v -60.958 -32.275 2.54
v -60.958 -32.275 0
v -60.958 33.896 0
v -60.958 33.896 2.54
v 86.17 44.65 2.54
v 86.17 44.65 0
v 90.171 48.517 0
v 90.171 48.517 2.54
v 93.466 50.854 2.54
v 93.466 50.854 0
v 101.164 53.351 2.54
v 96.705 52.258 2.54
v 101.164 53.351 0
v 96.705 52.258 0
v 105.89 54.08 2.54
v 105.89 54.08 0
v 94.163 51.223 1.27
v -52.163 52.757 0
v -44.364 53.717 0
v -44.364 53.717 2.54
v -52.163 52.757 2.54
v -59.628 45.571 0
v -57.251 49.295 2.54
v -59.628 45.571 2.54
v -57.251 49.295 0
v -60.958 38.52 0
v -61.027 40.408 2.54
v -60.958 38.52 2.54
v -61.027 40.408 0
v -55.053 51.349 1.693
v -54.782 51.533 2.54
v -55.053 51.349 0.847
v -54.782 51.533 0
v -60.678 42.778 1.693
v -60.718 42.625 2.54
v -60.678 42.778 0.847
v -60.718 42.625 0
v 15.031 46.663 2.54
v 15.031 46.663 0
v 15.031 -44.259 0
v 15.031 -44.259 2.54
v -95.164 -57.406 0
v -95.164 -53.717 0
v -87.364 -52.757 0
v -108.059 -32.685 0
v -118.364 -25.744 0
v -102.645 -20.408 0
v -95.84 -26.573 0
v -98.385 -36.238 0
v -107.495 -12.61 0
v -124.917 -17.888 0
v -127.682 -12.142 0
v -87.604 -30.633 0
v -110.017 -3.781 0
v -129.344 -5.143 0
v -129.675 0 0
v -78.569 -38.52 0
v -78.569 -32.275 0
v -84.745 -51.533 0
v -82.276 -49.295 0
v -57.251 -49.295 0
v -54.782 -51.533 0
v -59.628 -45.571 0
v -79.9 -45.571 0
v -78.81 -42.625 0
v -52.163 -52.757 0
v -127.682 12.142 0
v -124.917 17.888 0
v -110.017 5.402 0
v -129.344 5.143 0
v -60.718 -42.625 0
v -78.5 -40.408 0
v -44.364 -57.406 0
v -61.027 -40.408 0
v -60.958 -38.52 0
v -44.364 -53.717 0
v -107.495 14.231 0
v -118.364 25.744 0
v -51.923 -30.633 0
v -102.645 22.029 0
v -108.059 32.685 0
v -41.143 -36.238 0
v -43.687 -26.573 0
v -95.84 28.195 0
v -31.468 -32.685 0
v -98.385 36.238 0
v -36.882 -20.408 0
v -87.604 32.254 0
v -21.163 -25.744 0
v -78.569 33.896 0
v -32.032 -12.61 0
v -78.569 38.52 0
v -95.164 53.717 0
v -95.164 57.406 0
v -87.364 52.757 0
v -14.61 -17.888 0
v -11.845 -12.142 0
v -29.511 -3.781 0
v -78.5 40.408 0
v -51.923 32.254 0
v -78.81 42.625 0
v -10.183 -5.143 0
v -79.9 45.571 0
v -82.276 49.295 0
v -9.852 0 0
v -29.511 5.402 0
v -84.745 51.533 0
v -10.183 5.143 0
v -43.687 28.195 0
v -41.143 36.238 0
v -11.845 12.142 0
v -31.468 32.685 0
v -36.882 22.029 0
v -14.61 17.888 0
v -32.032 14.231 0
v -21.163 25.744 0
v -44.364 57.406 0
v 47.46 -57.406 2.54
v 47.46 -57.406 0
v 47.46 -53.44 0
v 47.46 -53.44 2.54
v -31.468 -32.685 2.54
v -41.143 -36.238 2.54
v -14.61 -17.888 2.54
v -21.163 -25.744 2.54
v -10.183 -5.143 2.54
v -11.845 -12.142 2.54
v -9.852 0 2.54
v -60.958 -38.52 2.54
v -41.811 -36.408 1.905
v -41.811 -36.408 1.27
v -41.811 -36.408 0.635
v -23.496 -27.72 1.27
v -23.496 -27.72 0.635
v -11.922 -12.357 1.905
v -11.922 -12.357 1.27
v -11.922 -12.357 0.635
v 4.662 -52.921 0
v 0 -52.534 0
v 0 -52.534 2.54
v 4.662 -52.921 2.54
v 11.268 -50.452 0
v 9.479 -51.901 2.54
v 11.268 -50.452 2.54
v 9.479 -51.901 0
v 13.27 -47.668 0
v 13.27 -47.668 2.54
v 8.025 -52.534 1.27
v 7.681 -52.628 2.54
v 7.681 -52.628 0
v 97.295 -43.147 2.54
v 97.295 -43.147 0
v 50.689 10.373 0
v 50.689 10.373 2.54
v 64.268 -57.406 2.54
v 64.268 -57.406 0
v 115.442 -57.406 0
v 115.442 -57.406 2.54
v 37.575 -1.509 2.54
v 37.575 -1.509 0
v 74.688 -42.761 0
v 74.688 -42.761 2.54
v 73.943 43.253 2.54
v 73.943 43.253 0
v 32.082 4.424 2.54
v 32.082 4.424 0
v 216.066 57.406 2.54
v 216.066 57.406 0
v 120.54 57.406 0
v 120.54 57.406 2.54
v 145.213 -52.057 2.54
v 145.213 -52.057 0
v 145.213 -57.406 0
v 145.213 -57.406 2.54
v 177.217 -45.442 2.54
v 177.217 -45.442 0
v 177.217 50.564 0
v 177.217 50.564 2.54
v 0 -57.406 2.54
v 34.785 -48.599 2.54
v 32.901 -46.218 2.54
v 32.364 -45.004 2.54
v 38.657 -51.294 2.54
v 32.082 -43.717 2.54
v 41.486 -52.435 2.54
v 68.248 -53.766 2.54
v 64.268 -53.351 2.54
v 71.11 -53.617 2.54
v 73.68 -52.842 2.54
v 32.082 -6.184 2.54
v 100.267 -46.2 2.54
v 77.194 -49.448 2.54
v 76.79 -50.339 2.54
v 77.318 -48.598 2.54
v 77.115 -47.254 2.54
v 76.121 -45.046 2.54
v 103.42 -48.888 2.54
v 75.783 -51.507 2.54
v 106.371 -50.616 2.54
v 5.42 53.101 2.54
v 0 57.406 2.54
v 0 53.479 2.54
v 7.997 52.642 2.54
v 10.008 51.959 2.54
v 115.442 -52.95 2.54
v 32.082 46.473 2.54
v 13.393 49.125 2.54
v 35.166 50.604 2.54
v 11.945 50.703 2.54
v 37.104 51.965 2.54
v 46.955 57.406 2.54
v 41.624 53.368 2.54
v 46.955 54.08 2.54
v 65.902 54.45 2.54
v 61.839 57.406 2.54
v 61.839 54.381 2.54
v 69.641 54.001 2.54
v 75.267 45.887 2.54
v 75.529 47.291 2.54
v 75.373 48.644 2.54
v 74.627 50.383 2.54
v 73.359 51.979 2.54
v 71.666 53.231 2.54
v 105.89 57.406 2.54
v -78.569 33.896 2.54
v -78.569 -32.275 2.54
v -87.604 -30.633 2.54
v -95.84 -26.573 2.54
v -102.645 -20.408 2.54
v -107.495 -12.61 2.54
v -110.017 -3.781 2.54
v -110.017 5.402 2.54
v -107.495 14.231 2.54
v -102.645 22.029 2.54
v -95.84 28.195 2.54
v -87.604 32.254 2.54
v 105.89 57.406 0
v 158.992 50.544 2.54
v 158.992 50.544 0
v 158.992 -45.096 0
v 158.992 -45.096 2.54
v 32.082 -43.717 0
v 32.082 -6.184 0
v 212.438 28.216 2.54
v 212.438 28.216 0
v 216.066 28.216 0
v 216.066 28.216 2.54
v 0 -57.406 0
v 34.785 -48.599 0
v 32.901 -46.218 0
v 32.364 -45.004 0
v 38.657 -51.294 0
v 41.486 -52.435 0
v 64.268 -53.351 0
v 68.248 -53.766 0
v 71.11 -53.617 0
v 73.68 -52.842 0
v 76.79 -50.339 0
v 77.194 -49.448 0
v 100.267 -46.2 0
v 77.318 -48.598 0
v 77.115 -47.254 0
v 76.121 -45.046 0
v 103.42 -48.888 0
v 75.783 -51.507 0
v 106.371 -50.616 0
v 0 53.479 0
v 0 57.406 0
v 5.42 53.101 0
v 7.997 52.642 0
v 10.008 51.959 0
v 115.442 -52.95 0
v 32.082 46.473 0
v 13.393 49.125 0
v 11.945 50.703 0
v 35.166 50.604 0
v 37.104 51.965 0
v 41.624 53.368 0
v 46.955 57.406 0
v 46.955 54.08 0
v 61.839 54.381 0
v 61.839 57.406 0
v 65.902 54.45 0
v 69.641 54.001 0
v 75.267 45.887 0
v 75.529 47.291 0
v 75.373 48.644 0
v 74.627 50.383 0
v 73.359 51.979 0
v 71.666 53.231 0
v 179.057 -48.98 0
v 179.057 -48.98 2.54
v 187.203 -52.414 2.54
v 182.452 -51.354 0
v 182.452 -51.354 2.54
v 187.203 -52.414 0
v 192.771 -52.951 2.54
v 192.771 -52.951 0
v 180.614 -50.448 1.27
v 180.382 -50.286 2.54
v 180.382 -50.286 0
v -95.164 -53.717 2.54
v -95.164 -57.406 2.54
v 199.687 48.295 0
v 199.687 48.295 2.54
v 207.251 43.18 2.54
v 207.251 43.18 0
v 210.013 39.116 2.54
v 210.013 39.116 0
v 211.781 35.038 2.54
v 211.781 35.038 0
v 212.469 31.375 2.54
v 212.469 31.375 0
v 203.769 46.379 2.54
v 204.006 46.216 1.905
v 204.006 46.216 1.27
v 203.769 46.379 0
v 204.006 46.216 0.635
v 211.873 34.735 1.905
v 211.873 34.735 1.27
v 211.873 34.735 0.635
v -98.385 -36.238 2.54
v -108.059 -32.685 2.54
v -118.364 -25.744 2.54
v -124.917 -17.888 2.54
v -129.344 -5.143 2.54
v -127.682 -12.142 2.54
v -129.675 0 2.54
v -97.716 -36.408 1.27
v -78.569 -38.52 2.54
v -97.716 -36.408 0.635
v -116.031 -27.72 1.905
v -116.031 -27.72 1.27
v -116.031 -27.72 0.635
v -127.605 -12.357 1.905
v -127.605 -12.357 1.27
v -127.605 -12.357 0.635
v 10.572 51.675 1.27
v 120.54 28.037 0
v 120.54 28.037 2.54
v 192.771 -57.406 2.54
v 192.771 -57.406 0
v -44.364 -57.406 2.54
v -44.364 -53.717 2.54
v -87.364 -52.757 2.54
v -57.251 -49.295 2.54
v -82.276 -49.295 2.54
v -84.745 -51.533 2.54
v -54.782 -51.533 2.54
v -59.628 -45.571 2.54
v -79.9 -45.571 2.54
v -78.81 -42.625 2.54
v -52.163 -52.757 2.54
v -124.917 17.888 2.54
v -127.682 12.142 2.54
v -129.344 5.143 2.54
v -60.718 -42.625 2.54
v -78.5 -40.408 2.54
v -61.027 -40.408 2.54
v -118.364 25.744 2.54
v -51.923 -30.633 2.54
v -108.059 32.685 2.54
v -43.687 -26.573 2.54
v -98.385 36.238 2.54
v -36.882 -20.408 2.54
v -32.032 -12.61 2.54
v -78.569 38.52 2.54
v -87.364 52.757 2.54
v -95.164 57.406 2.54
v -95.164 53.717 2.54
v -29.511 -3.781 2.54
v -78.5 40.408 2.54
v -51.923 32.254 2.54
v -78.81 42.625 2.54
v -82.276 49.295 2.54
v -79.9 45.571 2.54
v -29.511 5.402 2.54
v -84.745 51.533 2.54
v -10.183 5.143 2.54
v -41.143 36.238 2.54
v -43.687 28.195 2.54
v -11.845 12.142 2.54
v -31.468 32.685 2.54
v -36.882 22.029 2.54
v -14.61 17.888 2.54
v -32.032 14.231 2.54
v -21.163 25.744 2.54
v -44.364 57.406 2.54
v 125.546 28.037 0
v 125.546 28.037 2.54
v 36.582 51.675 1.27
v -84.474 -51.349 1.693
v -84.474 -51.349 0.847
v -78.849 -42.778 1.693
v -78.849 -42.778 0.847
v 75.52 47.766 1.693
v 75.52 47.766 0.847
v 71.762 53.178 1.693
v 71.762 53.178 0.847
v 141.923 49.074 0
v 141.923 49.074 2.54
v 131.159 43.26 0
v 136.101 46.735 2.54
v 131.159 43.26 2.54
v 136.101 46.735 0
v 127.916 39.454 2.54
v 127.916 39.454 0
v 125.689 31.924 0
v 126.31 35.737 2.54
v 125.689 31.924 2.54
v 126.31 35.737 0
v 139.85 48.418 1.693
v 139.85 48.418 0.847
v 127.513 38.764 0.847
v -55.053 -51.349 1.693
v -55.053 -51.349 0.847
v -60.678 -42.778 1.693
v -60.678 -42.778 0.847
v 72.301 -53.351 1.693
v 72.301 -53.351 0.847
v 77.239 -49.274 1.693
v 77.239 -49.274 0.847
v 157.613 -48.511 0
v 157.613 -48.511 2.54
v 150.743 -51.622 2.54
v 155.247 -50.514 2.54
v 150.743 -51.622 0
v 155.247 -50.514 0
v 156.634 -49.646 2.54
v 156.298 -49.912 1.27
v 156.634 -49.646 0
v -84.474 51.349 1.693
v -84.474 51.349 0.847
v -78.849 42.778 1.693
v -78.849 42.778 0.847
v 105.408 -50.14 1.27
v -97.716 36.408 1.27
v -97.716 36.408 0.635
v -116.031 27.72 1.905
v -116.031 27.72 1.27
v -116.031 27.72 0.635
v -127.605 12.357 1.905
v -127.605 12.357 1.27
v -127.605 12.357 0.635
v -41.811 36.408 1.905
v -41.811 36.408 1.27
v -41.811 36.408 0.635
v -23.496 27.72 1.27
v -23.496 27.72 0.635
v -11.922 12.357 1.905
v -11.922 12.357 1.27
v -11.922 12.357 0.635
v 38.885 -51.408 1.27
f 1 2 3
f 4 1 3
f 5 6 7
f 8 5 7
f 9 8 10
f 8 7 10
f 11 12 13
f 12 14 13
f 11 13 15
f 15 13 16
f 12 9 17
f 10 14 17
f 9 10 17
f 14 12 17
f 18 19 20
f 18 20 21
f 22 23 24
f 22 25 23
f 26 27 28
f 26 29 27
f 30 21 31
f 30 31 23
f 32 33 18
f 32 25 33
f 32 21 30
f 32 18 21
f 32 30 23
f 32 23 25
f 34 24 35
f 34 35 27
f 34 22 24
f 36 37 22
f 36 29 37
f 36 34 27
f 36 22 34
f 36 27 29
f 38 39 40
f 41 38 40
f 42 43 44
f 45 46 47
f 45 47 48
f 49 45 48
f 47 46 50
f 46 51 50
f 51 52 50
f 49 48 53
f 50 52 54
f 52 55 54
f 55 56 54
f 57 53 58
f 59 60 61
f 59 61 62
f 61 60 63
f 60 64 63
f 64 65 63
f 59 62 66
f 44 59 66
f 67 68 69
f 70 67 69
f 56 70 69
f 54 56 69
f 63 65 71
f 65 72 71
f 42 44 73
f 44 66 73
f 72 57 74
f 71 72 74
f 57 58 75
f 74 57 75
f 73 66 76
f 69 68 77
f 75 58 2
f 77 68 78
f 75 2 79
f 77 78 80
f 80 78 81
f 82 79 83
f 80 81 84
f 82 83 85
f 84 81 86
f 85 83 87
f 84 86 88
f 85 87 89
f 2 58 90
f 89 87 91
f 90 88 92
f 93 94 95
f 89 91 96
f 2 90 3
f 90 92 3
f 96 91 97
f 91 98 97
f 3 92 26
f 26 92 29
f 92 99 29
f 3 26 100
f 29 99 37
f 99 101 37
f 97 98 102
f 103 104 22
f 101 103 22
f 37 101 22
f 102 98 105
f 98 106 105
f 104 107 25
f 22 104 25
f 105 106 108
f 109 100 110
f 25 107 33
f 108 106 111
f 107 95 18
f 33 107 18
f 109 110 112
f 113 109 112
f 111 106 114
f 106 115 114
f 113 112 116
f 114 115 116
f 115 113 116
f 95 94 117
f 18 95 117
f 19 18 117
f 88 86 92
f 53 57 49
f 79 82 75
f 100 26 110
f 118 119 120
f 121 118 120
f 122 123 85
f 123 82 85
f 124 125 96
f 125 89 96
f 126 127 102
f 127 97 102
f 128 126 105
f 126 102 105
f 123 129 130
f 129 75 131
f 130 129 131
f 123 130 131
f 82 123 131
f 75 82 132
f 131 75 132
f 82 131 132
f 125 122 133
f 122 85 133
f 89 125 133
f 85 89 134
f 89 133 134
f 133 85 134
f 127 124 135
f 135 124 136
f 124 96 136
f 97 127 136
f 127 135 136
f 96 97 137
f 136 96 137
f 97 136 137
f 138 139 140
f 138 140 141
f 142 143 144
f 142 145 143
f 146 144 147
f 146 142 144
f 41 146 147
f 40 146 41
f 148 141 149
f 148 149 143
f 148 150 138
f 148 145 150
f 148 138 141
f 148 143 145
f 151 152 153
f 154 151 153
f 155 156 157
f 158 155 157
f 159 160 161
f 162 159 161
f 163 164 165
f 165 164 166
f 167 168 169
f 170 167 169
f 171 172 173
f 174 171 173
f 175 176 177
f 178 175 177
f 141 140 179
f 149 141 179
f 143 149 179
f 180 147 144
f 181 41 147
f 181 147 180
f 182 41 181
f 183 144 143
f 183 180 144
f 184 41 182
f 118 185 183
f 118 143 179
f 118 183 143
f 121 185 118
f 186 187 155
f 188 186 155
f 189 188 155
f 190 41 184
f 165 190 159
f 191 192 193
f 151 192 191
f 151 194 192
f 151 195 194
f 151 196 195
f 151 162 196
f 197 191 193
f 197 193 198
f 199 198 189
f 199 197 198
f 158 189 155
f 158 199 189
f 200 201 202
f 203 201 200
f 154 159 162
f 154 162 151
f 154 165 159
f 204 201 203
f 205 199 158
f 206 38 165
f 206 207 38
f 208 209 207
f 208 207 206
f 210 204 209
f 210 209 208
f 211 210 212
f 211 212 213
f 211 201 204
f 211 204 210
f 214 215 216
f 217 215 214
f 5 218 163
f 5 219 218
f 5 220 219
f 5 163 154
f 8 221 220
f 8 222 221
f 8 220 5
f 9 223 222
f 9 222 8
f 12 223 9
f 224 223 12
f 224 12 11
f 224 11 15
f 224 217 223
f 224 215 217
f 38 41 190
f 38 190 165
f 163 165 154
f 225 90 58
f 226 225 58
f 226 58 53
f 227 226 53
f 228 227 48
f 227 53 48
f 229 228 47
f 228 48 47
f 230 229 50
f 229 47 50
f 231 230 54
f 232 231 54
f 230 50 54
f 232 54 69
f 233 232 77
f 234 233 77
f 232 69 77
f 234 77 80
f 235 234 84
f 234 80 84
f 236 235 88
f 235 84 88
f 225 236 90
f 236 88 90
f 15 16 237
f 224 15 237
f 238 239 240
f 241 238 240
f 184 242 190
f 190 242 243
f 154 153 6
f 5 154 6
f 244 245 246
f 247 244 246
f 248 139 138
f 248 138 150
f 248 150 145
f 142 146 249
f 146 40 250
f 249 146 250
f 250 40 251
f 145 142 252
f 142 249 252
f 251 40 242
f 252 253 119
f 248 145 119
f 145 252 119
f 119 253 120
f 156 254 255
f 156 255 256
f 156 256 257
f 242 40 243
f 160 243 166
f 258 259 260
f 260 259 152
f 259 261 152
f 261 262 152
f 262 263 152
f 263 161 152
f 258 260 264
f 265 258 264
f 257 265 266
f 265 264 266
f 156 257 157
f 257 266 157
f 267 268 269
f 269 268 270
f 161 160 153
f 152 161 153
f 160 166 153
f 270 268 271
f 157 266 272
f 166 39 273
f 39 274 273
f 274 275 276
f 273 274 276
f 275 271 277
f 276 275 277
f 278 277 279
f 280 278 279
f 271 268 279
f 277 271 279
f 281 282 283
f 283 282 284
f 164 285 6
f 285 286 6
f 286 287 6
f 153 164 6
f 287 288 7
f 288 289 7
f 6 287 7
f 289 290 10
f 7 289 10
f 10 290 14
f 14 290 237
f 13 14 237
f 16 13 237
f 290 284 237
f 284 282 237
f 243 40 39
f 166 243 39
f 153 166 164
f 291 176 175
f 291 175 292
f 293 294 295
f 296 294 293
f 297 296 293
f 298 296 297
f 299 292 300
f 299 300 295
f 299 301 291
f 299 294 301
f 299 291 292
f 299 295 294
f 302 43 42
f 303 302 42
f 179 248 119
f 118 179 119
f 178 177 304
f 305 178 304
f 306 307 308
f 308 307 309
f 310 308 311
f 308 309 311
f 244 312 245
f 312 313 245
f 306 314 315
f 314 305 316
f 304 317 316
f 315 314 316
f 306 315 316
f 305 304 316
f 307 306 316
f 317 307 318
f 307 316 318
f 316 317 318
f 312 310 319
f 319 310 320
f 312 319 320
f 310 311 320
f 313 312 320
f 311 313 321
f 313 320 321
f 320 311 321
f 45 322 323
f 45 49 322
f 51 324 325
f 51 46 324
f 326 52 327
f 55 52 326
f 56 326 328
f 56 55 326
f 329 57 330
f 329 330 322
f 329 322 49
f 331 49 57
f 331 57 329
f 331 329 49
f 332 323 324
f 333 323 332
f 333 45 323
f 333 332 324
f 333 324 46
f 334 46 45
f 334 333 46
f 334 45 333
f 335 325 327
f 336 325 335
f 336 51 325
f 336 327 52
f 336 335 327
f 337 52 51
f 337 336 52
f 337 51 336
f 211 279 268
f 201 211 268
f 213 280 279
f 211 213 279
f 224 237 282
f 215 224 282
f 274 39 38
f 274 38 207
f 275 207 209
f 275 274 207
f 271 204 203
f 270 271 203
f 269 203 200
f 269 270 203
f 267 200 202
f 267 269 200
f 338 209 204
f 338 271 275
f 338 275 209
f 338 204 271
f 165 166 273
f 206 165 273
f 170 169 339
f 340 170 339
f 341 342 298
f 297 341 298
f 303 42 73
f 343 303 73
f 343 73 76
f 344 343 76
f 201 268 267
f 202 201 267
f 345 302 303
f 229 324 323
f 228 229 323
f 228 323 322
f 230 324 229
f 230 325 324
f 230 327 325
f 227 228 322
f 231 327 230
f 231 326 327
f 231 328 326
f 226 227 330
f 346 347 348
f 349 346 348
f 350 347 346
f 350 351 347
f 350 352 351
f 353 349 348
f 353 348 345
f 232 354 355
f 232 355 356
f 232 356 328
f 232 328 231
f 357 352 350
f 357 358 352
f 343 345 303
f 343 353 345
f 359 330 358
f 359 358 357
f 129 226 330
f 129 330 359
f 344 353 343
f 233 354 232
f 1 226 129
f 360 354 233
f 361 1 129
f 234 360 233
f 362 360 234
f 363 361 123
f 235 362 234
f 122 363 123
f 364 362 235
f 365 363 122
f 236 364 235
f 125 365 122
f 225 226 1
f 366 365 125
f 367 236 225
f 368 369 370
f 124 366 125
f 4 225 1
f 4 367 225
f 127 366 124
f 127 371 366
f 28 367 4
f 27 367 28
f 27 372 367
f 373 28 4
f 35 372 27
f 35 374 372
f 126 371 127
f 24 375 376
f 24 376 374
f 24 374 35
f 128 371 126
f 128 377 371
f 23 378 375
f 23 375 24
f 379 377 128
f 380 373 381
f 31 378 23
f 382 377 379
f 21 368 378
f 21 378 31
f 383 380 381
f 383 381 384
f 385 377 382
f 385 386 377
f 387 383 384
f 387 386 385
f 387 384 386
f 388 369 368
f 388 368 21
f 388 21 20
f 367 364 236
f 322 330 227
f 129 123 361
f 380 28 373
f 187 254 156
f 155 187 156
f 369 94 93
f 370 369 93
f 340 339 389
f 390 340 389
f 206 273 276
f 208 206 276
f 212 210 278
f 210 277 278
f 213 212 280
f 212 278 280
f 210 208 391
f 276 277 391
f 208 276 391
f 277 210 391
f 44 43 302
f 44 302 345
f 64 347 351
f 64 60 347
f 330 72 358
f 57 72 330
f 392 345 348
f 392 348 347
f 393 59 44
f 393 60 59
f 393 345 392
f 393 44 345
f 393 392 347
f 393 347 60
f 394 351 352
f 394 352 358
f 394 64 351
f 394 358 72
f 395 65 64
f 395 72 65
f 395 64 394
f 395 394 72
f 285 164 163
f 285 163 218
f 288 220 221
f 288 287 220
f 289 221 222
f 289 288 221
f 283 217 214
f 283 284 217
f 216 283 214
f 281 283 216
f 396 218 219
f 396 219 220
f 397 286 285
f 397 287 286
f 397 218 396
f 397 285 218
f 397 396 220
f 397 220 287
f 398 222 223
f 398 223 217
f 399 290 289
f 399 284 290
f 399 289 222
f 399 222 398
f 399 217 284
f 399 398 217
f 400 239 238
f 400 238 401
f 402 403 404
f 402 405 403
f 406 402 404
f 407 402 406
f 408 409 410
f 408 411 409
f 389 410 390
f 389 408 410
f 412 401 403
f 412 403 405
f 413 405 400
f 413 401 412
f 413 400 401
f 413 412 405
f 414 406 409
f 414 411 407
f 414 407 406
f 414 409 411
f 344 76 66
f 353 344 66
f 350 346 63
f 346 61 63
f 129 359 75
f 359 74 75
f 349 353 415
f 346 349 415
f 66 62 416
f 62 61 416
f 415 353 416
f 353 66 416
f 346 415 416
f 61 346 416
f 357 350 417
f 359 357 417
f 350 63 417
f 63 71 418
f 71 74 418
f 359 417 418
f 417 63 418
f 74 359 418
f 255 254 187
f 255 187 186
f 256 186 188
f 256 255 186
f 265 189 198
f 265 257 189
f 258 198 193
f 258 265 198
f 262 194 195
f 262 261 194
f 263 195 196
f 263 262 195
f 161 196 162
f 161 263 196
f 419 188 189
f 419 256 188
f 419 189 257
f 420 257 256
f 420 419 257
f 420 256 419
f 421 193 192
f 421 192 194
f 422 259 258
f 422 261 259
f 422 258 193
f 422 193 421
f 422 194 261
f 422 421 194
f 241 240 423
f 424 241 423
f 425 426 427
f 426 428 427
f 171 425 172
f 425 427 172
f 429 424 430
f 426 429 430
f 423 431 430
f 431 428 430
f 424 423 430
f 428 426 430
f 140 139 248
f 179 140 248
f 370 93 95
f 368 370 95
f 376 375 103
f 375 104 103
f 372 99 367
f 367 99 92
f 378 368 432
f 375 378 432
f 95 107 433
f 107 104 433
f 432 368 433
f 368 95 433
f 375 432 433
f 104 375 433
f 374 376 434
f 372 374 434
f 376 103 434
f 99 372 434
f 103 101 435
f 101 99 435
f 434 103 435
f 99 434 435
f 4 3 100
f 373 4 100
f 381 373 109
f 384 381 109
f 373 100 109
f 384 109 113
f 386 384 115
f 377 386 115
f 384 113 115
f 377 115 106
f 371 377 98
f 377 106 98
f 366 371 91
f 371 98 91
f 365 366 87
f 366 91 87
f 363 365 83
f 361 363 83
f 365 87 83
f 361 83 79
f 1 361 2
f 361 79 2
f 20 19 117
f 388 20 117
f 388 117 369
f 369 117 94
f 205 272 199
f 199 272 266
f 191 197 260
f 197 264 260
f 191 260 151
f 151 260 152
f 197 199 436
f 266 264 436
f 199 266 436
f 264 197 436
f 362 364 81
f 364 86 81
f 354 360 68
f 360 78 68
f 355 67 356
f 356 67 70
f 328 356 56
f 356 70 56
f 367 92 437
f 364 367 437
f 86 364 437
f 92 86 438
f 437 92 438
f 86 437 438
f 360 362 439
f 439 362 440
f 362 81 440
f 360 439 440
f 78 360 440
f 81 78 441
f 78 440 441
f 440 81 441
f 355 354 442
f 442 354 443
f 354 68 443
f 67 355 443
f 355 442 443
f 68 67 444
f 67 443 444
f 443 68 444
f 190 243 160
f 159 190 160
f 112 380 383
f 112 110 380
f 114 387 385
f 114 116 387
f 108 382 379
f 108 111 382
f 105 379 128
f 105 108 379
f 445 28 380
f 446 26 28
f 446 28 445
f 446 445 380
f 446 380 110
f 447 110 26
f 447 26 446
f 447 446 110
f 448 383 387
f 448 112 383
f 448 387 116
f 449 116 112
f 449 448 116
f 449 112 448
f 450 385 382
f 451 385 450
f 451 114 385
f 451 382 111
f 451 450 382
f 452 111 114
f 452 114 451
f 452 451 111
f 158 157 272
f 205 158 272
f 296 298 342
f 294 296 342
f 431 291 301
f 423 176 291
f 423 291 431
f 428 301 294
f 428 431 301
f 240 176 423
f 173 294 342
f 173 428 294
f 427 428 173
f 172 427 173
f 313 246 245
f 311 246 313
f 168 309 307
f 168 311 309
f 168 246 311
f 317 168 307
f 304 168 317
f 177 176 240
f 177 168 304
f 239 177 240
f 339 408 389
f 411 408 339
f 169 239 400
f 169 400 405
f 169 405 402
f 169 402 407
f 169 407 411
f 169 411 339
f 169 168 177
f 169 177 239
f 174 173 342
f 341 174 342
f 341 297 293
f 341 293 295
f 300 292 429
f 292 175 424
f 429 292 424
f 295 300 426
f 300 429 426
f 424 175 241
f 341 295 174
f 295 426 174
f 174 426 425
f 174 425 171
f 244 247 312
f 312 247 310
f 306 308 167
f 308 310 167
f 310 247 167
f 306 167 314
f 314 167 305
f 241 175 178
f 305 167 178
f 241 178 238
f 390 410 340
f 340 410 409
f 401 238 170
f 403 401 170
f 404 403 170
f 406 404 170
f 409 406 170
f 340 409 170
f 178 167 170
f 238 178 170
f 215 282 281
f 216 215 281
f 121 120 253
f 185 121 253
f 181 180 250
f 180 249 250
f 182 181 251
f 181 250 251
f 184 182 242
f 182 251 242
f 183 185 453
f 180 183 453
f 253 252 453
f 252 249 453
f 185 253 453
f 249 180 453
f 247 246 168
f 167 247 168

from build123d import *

# Parameters (mm, degrees)
F1_DEPTH = 2.54
F2_W     = 602.5793105364
F2_H     = 243.5958907008
F3_DEPTH = 2.54


with BuildPart() as f1:
    # F0 (on Top) → F1 (new body)
    with BuildSketch(Plane.XY):
        with BuildLine():
            Line((-69.7635483229, 57.4059132741), (-95.1635483229, 57.4059132741))
            Line((-95.1635483229, 57.4059132741), (-95.1635483229, 53.7165255108))
            add(Edge.make_bspline(
                [(-95.1635483229, 53.7165255108), (-91.3032409816, 53.5783986368), (-83.7072737598, 53.306604939), (-78.2478533703, 42.9895455517), (-78.4786919856, 39.7790776836), (-78.5692110089, 38.5201530647)],
                knots=[0, 0, 0, 0, 0.3858065452, 0.7591555833, 1, 1, 1, 1], degree=3))
            add(Edge.make_bspline(
                [(-78.5692110089, 38.5201530647), (-84.5362422757, 38.4332970287), (-98.1471059941, 37.5648360945), (-116.8947668137, 29.1109906389), (-128.8405157483, 14.0244150421), (-129.7674531854, 2.312749047), (-129.6753650631, 0)],
                knots=[0, 0, 0, 0, 0.260988986, 0.5287181577, 0.7895137826, 1, 1, 1, 1], degree=3))
            add(Edge.make_bspline(
                [(-78.5692110089, -38.5201530647), (-84.5362422757, -38.4332970287), (-98.1471059941, -37.5648360945), (-116.8947668137, -29.1109906389), (-128.8405157483, -14.0244150421), (-129.7674531854, -2.312749047), (-129.6753650631, 0)],
                knots=[0, 0, 0, 0, 0.260988986, 0.5287181577, 0.7895137826, 1, 1, 1, 1], degree=3))
            add(Edge.make_bspline(
                [(-95.1635483229, -53.7165255108), (-91.3032409816, -53.5783986368), (-83.7072737598, -53.306604939), (-78.2478533703, -42.9895455517), (-78.4786919856, -39.7790776836), (-78.5692110089, -38.5201530647)],
                knots=[0, 0, 0, 0, 0.3858065452, 0.7591555833, 1, 1, 1, 1], degree=3))
            Line((-95.1635483229, -53.7165255108), (-95.1635483229, -57.4059132741))
            Line((-95.1635483229, -57.4059132741), (-69.7635483229, -57.4059132741))
            Line((-69.7635483229, -57.4059132741), (-69.7635483229, 57.4059132741))
        make_face()
        with BuildLine():
            ThreePointArc((-78.5692110089, -32.2747373481), (-110.3363536252, 0.8107026173), (-78.5692110089, 33.8961425826))
            Line((-78.5692110089, 33.8961425826), (-78.5692110089, 0))
            Line((-78.5692110089, 0), (-78.5692110089, -32.2747373481))
        make_face(mode=Mode.SUBTRACT)
        with BuildLine():
            Line((-44.3635483229, 57.4059132741), (-69.7635483229, 57.4059132741))
            Line((-69.7635483229, 57.4059132741), (-69.7635483229, -57.4059132741))
            Line((-69.7635483229, -57.4059132741), (-44.3635483229, -57.4059132741))
            Line((-44.3635483229, -57.4059132741), (-44.3635483229, -53.7165255108))
            add(Edge.make_bspline(
                [(-44.3635483229, -53.7165255108), (-48.2238556642, -53.5783986368), (-55.8198228859, -53.306604939), (-61.2792432755, -42.9895455517), (-61.0484046601, -39.7790776836), (-60.9578856368, -38.5201530647)],
                knots=[0, 0, 0, 0, 0.3858065452, 0.7591555833, 1, 1, 1, 1], degree=3))
            add(Edge.make_bspline(
                [(-60.9578856368, -38.5201530647), (-54.99085437, -38.4332970287), (-41.3799906516, -37.5648360945), (-22.6323298321, -29.1109906389), (-10.6865808975, -14.0244150421), (-9.7596434604, -2.312749047), (-9.8517315826, 0)],
                knots=[0, 0, 0, 0, 0.260988986, 0.5287181577, 0.7895137826, 1, 1, 1, 1], degree=3))
            add(Edge.make_bspline(
                [(-60.9578856368, 38.5201530647), (-54.99085437, 38.4332970287), (-41.3799906516, 37.5648360945), (-22.6323298321, 29.1109906389), (-10.6865808975, 14.0244150421), (-9.7596434604, 2.312749047), (-9.8517315826, 0)],
                knots=[0, 0, 0, 0, 0.260988986, 0.5287181577, 0.7895137826, 1, 1, 1, 1], degree=3))
            add(Edge.make_bspline(
                [(-44.3635483229, 53.7165255108), (-48.2238556642, 53.5783986368), (-55.8198228859, 53.306604939), (-61.2792432755, 42.9895455517), (-61.0484046601, 39.7790776836), (-60.9578856368, 38.5201530647)],
                knots=[0, 0, 0, 0, 0.3858065452, 0.7591555833, 1, 1, 1, 1], degree=3))
            Line((-44.3635483229, 53.7165255108), (-44.3635483229, 57.4059132741))
        make_face()
        with BuildLine():
            Line((-60.9578856368, 0), (-60.9578856368, 33.8961425826))
            ThreePointArc((-60.9578856368, 33.8961425826), (-29.1907430205, 0.8107026173), (-60.9578856368, -32.2747373481))
            Line((-60.9578856368, -32.2747373481), (-60.9578856368, 0))
        make_face(mode=Mode.SUBTRACT)
    extrude(amount=F1_DEPTH)


with BuildPart() as f1b:
    # F0 (on Top) → F1, piece 2 (new body)
    with BuildSketch(Plane.XY):
        with BuildLine():
            Line((15.0312080813, 46.6626754542), (15.0312080813, -44.2586236274))
            add(Edge.make_bspline(
                [(0, -52.5342177984), (1.0417254513, -52.5342177984), (9.8768053078, -54.4209252677), (13.15479739, -48.147935277), (15.0312080813, -44.2586236274)],
                knots=[0, 0, 0, 0, 0.4624454469, 1, 1, 1, 1], degree=3))
            Line((0, -52.5342177984), (0, -57.4059132741))
            Line((0, -57.4059132741), (47.4604713734, -57.4059132741))
            Line((47.4604713734, -57.4059132741), (47.4604713734, -53.4396920118))
            add(Edge.make_bspline(
                [(47.4604713734, -53.4396920118), (44.4200368097, -53.1706595717), (38.8806565826, -52.434578092), (32.4466357123, -47.1375636916), (32.0815469704, -43.716837814)],
                knots=[0, 0, 0, 0, 0.4808917688, 1, 1, 1, 1], degree=3))
            Line((32.0815469704, -43.716837814), (32.0815469704, -6.1835568628))
            Line((32.0815469704, -6.1835568628), (37.5747432401, -1.5085025872))
            Line((37.5747432401, -1.5085025872), (74.6877068903, -42.7611778189))
            add(Edge.make_bspline(
                [(64.2675012435, -53.3511242267), (66.9904733814, -53.7227410487), (72.1445233128, -54.4261384979), (79.1160162865, -49.513122206), (76.1853605985, -45.0446846032), (74.6877068903, -42.7611778189)],
                knots=[0, 0, 0, 0, 0.3538713129, 0.6698086957, 1, 1, 1, 1], degree=3))
            Line((64.2675012435, -53.3511242267), (64.2675012435, -57.4059132741))
            Line((64.2675012435, -57.4059132741), (115.4419480451, -57.4059132741))
            Line((115.4419480451, -57.4059132741), (115.4419480451, -52.9497714859))
            add(Edge.make_bspline(
                [(115.4419480451, -52.9497714859), (111.929007672, -52.3516227758), (104.8545009021, -51.1470457975), (99.8265362569, -45.8260070489), (97.2952742895, -43.1472008197)],
                knots=[0, 0, 0, 0, 0.4965632923, 1, 1, 1, 1], degree=3))
            Line((97.2952742895, -43.1472008197), (50.6888684884, 10.3728463997))
            Line((50.6888684884, 10.3728463997), (86.1698702601, 44.6497307785))
            add(Edge.make_bspline(
                [(86.1698702601, 44.6497307785), (88.6046135444, 47.1557989881), (93.6687073386, 52.3682435813), (101.7130311796, 53.4949115172), (105.8897600974, 54.0798937533)],
                knots=[0, 0, 0, 0, 0.4807855824, 1, 1, 1, 1], degree=3))
            Line((105.8897600974, 54.0798937533), (105.8897600974, 57.4059132741))
            Line((105.8897600974, 57.4059132741), (61.8392000344, 57.4059132741))
            Line((61.8392000344, 57.4059132741), (61.8392000344, 54.3805714916))
            add(Edge.make_bspline(
                [(73.9434983857, 43.2532406243), (74.7921079461, 44.6804079243), (76.6370571494, 47.7831907537), (72.0835068154, 54.7677163862), (65.4823542386, 54.518250749), (61.8392000344, 54.3805714916)],
                knots=[0, 0, 0, 0, 0.2762338687, 0.6005558736, 1, 1, 1, 1], degree=3))
            Line((73.9434983857, 43.2532406243), (32.0815469704, 4.4235725389))
            Line((32.0815469704, 4.4235725389), (32.0815469704, 46.473262822))
            add(Edge.make_bspline(
                [(32.0815469704, 46.473262822), (33.2966124138, 48.4497065283), (36.0236034249, 52.8854710794), (43.0561605898, 53.6538702292), (46.9552211076, 54.0798937533)],
                knots=[0, 0, 0, 0, 0.4455700215, 1, 1, 1, 1], degree=3))
            Line((46.9552211076, 54.0798937533), (46.9552211076, 57.4059132741))
            Line((46.9552211076, 57.4059132741), (0, 57.4059132741))
            Line((0, 57.4059132741), (0, 53.4785443456))
            add(Edge.make_bspline(
                [(15.0312080813, 46.6626754542), (13.8320708177, 48.5971526959), (11.1167205479, 52.9776214376), (3.9832362609, 53.2990584727), (0, 53.4785443456)],
                knots=[0, 0, 0, 0, 0.4416142097, 1, 1, 1, 1], degree=3))
        make_face()
    extrude(amount=F1_DEPTH)


with BuildPart() as f1c:
    # F0 (on Top) → F1, piece 3 (new body)
    with BuildSketch(Plane.XY):
        with BuildLine():
            add(Edge.make_bspline(
                [(158.9915424015, 50.5443920614), (152.38165043, 50.5486874846), (139.8105332639, 50.5568567963), (125.7374746376, 39.7695060836), (125.6062021514, 31.7051308011), (125.5464921343, 28.0370050591)],
                knots=[0, 0, 0, 0, 0.3767388978, 0.7165062373, 1, 1, 1, 1], degree=3))
            Line((158.9915424015, 50.5443920614), (158.9915424015, -45.0958256047))
            add(Edge.make_bspline(
                [(158.9915424015, -45.0958256047), (158.4404982104, -46.9286305172), (157.1012269393, -51.3831243748), (149.6177217356, -51.8075651394), (145.2133104846, -52.0573694261)],
                knots=[0, 0, 0, 0, 0.4114507666, 1, 1, 1, 1], degree=3))
            Line((145.2133104846, -52.0573694261), (145.2133104846, -57.4059132741))
            Line((145.2133104846, -57.4059132741), (192.77124951, -57.4059132741))
            Line((192.77124951, -57.4059132741), (192.77124951, -52.9512826123))
            add(Edge.make_bspline(
                [(177.2165762532, -45.4424349095), (178.0001061434, -47.3343375977), (179.9059689007, -51.9362129302), (188.0030214748, -52.5750697754), (192.77124951, -52.9512826123)],
                knots=[0, 0, 0, 0, 0.4111155891, 1, 1, 1, 1], degree=3))
            Line((177.2165762532, -45.4424349095), (177.2165762532, 50.5635451332))
            add(Edge.make_bspline(
                [(177.2165762532, 50.5635451332), (181.8022767761, 50.2677587533), (190.89960941, 49.6809635465), (204.9656834592, 48.4535677259), (212.7734382816, 35.0396926696), (212.535051211, 30.1889662243), (212.4380799979, 28.2157852689)],
                knots=[0, 0, 0, 0, 0.2722174992, 0.5400381309, 0.8128964784, 1, 1, 1, 1], degree=3))
            Line((212.4380799979, 28.2157852689), (216.0664340341, 28.2157852689))
            Line((216.0664340341, 28.2157852689), (216.0664340341, 57.4059132741))
            Line((216.0664340341, 57.4059132741), (120.540391373, 57.4059132741))
            Line((120.540391373, 57.4059132741), (120.540391373, 28.0370050591))
            Line((120.540391373, 28.0370050591), (125.5464921343, 28.0370050591))
        make_face()
    extrude(amount=F1_DEPTH)


with BuildPart() as f3:
    # F2 (on face) → F3 (new body)
    with BuildSketch(Plane(origin=(0, 0, 0), x_dir=(1, 0, 0), z_dir=(0, 0, -1))):
        with Locations((72.2850486636, -7.4851848185)):
            Rectangle(F2_W, F2_H)
    extrude(amount=F3_DEPTH)


solid = Compound([f1.part, f1b.part, f1c.part])
